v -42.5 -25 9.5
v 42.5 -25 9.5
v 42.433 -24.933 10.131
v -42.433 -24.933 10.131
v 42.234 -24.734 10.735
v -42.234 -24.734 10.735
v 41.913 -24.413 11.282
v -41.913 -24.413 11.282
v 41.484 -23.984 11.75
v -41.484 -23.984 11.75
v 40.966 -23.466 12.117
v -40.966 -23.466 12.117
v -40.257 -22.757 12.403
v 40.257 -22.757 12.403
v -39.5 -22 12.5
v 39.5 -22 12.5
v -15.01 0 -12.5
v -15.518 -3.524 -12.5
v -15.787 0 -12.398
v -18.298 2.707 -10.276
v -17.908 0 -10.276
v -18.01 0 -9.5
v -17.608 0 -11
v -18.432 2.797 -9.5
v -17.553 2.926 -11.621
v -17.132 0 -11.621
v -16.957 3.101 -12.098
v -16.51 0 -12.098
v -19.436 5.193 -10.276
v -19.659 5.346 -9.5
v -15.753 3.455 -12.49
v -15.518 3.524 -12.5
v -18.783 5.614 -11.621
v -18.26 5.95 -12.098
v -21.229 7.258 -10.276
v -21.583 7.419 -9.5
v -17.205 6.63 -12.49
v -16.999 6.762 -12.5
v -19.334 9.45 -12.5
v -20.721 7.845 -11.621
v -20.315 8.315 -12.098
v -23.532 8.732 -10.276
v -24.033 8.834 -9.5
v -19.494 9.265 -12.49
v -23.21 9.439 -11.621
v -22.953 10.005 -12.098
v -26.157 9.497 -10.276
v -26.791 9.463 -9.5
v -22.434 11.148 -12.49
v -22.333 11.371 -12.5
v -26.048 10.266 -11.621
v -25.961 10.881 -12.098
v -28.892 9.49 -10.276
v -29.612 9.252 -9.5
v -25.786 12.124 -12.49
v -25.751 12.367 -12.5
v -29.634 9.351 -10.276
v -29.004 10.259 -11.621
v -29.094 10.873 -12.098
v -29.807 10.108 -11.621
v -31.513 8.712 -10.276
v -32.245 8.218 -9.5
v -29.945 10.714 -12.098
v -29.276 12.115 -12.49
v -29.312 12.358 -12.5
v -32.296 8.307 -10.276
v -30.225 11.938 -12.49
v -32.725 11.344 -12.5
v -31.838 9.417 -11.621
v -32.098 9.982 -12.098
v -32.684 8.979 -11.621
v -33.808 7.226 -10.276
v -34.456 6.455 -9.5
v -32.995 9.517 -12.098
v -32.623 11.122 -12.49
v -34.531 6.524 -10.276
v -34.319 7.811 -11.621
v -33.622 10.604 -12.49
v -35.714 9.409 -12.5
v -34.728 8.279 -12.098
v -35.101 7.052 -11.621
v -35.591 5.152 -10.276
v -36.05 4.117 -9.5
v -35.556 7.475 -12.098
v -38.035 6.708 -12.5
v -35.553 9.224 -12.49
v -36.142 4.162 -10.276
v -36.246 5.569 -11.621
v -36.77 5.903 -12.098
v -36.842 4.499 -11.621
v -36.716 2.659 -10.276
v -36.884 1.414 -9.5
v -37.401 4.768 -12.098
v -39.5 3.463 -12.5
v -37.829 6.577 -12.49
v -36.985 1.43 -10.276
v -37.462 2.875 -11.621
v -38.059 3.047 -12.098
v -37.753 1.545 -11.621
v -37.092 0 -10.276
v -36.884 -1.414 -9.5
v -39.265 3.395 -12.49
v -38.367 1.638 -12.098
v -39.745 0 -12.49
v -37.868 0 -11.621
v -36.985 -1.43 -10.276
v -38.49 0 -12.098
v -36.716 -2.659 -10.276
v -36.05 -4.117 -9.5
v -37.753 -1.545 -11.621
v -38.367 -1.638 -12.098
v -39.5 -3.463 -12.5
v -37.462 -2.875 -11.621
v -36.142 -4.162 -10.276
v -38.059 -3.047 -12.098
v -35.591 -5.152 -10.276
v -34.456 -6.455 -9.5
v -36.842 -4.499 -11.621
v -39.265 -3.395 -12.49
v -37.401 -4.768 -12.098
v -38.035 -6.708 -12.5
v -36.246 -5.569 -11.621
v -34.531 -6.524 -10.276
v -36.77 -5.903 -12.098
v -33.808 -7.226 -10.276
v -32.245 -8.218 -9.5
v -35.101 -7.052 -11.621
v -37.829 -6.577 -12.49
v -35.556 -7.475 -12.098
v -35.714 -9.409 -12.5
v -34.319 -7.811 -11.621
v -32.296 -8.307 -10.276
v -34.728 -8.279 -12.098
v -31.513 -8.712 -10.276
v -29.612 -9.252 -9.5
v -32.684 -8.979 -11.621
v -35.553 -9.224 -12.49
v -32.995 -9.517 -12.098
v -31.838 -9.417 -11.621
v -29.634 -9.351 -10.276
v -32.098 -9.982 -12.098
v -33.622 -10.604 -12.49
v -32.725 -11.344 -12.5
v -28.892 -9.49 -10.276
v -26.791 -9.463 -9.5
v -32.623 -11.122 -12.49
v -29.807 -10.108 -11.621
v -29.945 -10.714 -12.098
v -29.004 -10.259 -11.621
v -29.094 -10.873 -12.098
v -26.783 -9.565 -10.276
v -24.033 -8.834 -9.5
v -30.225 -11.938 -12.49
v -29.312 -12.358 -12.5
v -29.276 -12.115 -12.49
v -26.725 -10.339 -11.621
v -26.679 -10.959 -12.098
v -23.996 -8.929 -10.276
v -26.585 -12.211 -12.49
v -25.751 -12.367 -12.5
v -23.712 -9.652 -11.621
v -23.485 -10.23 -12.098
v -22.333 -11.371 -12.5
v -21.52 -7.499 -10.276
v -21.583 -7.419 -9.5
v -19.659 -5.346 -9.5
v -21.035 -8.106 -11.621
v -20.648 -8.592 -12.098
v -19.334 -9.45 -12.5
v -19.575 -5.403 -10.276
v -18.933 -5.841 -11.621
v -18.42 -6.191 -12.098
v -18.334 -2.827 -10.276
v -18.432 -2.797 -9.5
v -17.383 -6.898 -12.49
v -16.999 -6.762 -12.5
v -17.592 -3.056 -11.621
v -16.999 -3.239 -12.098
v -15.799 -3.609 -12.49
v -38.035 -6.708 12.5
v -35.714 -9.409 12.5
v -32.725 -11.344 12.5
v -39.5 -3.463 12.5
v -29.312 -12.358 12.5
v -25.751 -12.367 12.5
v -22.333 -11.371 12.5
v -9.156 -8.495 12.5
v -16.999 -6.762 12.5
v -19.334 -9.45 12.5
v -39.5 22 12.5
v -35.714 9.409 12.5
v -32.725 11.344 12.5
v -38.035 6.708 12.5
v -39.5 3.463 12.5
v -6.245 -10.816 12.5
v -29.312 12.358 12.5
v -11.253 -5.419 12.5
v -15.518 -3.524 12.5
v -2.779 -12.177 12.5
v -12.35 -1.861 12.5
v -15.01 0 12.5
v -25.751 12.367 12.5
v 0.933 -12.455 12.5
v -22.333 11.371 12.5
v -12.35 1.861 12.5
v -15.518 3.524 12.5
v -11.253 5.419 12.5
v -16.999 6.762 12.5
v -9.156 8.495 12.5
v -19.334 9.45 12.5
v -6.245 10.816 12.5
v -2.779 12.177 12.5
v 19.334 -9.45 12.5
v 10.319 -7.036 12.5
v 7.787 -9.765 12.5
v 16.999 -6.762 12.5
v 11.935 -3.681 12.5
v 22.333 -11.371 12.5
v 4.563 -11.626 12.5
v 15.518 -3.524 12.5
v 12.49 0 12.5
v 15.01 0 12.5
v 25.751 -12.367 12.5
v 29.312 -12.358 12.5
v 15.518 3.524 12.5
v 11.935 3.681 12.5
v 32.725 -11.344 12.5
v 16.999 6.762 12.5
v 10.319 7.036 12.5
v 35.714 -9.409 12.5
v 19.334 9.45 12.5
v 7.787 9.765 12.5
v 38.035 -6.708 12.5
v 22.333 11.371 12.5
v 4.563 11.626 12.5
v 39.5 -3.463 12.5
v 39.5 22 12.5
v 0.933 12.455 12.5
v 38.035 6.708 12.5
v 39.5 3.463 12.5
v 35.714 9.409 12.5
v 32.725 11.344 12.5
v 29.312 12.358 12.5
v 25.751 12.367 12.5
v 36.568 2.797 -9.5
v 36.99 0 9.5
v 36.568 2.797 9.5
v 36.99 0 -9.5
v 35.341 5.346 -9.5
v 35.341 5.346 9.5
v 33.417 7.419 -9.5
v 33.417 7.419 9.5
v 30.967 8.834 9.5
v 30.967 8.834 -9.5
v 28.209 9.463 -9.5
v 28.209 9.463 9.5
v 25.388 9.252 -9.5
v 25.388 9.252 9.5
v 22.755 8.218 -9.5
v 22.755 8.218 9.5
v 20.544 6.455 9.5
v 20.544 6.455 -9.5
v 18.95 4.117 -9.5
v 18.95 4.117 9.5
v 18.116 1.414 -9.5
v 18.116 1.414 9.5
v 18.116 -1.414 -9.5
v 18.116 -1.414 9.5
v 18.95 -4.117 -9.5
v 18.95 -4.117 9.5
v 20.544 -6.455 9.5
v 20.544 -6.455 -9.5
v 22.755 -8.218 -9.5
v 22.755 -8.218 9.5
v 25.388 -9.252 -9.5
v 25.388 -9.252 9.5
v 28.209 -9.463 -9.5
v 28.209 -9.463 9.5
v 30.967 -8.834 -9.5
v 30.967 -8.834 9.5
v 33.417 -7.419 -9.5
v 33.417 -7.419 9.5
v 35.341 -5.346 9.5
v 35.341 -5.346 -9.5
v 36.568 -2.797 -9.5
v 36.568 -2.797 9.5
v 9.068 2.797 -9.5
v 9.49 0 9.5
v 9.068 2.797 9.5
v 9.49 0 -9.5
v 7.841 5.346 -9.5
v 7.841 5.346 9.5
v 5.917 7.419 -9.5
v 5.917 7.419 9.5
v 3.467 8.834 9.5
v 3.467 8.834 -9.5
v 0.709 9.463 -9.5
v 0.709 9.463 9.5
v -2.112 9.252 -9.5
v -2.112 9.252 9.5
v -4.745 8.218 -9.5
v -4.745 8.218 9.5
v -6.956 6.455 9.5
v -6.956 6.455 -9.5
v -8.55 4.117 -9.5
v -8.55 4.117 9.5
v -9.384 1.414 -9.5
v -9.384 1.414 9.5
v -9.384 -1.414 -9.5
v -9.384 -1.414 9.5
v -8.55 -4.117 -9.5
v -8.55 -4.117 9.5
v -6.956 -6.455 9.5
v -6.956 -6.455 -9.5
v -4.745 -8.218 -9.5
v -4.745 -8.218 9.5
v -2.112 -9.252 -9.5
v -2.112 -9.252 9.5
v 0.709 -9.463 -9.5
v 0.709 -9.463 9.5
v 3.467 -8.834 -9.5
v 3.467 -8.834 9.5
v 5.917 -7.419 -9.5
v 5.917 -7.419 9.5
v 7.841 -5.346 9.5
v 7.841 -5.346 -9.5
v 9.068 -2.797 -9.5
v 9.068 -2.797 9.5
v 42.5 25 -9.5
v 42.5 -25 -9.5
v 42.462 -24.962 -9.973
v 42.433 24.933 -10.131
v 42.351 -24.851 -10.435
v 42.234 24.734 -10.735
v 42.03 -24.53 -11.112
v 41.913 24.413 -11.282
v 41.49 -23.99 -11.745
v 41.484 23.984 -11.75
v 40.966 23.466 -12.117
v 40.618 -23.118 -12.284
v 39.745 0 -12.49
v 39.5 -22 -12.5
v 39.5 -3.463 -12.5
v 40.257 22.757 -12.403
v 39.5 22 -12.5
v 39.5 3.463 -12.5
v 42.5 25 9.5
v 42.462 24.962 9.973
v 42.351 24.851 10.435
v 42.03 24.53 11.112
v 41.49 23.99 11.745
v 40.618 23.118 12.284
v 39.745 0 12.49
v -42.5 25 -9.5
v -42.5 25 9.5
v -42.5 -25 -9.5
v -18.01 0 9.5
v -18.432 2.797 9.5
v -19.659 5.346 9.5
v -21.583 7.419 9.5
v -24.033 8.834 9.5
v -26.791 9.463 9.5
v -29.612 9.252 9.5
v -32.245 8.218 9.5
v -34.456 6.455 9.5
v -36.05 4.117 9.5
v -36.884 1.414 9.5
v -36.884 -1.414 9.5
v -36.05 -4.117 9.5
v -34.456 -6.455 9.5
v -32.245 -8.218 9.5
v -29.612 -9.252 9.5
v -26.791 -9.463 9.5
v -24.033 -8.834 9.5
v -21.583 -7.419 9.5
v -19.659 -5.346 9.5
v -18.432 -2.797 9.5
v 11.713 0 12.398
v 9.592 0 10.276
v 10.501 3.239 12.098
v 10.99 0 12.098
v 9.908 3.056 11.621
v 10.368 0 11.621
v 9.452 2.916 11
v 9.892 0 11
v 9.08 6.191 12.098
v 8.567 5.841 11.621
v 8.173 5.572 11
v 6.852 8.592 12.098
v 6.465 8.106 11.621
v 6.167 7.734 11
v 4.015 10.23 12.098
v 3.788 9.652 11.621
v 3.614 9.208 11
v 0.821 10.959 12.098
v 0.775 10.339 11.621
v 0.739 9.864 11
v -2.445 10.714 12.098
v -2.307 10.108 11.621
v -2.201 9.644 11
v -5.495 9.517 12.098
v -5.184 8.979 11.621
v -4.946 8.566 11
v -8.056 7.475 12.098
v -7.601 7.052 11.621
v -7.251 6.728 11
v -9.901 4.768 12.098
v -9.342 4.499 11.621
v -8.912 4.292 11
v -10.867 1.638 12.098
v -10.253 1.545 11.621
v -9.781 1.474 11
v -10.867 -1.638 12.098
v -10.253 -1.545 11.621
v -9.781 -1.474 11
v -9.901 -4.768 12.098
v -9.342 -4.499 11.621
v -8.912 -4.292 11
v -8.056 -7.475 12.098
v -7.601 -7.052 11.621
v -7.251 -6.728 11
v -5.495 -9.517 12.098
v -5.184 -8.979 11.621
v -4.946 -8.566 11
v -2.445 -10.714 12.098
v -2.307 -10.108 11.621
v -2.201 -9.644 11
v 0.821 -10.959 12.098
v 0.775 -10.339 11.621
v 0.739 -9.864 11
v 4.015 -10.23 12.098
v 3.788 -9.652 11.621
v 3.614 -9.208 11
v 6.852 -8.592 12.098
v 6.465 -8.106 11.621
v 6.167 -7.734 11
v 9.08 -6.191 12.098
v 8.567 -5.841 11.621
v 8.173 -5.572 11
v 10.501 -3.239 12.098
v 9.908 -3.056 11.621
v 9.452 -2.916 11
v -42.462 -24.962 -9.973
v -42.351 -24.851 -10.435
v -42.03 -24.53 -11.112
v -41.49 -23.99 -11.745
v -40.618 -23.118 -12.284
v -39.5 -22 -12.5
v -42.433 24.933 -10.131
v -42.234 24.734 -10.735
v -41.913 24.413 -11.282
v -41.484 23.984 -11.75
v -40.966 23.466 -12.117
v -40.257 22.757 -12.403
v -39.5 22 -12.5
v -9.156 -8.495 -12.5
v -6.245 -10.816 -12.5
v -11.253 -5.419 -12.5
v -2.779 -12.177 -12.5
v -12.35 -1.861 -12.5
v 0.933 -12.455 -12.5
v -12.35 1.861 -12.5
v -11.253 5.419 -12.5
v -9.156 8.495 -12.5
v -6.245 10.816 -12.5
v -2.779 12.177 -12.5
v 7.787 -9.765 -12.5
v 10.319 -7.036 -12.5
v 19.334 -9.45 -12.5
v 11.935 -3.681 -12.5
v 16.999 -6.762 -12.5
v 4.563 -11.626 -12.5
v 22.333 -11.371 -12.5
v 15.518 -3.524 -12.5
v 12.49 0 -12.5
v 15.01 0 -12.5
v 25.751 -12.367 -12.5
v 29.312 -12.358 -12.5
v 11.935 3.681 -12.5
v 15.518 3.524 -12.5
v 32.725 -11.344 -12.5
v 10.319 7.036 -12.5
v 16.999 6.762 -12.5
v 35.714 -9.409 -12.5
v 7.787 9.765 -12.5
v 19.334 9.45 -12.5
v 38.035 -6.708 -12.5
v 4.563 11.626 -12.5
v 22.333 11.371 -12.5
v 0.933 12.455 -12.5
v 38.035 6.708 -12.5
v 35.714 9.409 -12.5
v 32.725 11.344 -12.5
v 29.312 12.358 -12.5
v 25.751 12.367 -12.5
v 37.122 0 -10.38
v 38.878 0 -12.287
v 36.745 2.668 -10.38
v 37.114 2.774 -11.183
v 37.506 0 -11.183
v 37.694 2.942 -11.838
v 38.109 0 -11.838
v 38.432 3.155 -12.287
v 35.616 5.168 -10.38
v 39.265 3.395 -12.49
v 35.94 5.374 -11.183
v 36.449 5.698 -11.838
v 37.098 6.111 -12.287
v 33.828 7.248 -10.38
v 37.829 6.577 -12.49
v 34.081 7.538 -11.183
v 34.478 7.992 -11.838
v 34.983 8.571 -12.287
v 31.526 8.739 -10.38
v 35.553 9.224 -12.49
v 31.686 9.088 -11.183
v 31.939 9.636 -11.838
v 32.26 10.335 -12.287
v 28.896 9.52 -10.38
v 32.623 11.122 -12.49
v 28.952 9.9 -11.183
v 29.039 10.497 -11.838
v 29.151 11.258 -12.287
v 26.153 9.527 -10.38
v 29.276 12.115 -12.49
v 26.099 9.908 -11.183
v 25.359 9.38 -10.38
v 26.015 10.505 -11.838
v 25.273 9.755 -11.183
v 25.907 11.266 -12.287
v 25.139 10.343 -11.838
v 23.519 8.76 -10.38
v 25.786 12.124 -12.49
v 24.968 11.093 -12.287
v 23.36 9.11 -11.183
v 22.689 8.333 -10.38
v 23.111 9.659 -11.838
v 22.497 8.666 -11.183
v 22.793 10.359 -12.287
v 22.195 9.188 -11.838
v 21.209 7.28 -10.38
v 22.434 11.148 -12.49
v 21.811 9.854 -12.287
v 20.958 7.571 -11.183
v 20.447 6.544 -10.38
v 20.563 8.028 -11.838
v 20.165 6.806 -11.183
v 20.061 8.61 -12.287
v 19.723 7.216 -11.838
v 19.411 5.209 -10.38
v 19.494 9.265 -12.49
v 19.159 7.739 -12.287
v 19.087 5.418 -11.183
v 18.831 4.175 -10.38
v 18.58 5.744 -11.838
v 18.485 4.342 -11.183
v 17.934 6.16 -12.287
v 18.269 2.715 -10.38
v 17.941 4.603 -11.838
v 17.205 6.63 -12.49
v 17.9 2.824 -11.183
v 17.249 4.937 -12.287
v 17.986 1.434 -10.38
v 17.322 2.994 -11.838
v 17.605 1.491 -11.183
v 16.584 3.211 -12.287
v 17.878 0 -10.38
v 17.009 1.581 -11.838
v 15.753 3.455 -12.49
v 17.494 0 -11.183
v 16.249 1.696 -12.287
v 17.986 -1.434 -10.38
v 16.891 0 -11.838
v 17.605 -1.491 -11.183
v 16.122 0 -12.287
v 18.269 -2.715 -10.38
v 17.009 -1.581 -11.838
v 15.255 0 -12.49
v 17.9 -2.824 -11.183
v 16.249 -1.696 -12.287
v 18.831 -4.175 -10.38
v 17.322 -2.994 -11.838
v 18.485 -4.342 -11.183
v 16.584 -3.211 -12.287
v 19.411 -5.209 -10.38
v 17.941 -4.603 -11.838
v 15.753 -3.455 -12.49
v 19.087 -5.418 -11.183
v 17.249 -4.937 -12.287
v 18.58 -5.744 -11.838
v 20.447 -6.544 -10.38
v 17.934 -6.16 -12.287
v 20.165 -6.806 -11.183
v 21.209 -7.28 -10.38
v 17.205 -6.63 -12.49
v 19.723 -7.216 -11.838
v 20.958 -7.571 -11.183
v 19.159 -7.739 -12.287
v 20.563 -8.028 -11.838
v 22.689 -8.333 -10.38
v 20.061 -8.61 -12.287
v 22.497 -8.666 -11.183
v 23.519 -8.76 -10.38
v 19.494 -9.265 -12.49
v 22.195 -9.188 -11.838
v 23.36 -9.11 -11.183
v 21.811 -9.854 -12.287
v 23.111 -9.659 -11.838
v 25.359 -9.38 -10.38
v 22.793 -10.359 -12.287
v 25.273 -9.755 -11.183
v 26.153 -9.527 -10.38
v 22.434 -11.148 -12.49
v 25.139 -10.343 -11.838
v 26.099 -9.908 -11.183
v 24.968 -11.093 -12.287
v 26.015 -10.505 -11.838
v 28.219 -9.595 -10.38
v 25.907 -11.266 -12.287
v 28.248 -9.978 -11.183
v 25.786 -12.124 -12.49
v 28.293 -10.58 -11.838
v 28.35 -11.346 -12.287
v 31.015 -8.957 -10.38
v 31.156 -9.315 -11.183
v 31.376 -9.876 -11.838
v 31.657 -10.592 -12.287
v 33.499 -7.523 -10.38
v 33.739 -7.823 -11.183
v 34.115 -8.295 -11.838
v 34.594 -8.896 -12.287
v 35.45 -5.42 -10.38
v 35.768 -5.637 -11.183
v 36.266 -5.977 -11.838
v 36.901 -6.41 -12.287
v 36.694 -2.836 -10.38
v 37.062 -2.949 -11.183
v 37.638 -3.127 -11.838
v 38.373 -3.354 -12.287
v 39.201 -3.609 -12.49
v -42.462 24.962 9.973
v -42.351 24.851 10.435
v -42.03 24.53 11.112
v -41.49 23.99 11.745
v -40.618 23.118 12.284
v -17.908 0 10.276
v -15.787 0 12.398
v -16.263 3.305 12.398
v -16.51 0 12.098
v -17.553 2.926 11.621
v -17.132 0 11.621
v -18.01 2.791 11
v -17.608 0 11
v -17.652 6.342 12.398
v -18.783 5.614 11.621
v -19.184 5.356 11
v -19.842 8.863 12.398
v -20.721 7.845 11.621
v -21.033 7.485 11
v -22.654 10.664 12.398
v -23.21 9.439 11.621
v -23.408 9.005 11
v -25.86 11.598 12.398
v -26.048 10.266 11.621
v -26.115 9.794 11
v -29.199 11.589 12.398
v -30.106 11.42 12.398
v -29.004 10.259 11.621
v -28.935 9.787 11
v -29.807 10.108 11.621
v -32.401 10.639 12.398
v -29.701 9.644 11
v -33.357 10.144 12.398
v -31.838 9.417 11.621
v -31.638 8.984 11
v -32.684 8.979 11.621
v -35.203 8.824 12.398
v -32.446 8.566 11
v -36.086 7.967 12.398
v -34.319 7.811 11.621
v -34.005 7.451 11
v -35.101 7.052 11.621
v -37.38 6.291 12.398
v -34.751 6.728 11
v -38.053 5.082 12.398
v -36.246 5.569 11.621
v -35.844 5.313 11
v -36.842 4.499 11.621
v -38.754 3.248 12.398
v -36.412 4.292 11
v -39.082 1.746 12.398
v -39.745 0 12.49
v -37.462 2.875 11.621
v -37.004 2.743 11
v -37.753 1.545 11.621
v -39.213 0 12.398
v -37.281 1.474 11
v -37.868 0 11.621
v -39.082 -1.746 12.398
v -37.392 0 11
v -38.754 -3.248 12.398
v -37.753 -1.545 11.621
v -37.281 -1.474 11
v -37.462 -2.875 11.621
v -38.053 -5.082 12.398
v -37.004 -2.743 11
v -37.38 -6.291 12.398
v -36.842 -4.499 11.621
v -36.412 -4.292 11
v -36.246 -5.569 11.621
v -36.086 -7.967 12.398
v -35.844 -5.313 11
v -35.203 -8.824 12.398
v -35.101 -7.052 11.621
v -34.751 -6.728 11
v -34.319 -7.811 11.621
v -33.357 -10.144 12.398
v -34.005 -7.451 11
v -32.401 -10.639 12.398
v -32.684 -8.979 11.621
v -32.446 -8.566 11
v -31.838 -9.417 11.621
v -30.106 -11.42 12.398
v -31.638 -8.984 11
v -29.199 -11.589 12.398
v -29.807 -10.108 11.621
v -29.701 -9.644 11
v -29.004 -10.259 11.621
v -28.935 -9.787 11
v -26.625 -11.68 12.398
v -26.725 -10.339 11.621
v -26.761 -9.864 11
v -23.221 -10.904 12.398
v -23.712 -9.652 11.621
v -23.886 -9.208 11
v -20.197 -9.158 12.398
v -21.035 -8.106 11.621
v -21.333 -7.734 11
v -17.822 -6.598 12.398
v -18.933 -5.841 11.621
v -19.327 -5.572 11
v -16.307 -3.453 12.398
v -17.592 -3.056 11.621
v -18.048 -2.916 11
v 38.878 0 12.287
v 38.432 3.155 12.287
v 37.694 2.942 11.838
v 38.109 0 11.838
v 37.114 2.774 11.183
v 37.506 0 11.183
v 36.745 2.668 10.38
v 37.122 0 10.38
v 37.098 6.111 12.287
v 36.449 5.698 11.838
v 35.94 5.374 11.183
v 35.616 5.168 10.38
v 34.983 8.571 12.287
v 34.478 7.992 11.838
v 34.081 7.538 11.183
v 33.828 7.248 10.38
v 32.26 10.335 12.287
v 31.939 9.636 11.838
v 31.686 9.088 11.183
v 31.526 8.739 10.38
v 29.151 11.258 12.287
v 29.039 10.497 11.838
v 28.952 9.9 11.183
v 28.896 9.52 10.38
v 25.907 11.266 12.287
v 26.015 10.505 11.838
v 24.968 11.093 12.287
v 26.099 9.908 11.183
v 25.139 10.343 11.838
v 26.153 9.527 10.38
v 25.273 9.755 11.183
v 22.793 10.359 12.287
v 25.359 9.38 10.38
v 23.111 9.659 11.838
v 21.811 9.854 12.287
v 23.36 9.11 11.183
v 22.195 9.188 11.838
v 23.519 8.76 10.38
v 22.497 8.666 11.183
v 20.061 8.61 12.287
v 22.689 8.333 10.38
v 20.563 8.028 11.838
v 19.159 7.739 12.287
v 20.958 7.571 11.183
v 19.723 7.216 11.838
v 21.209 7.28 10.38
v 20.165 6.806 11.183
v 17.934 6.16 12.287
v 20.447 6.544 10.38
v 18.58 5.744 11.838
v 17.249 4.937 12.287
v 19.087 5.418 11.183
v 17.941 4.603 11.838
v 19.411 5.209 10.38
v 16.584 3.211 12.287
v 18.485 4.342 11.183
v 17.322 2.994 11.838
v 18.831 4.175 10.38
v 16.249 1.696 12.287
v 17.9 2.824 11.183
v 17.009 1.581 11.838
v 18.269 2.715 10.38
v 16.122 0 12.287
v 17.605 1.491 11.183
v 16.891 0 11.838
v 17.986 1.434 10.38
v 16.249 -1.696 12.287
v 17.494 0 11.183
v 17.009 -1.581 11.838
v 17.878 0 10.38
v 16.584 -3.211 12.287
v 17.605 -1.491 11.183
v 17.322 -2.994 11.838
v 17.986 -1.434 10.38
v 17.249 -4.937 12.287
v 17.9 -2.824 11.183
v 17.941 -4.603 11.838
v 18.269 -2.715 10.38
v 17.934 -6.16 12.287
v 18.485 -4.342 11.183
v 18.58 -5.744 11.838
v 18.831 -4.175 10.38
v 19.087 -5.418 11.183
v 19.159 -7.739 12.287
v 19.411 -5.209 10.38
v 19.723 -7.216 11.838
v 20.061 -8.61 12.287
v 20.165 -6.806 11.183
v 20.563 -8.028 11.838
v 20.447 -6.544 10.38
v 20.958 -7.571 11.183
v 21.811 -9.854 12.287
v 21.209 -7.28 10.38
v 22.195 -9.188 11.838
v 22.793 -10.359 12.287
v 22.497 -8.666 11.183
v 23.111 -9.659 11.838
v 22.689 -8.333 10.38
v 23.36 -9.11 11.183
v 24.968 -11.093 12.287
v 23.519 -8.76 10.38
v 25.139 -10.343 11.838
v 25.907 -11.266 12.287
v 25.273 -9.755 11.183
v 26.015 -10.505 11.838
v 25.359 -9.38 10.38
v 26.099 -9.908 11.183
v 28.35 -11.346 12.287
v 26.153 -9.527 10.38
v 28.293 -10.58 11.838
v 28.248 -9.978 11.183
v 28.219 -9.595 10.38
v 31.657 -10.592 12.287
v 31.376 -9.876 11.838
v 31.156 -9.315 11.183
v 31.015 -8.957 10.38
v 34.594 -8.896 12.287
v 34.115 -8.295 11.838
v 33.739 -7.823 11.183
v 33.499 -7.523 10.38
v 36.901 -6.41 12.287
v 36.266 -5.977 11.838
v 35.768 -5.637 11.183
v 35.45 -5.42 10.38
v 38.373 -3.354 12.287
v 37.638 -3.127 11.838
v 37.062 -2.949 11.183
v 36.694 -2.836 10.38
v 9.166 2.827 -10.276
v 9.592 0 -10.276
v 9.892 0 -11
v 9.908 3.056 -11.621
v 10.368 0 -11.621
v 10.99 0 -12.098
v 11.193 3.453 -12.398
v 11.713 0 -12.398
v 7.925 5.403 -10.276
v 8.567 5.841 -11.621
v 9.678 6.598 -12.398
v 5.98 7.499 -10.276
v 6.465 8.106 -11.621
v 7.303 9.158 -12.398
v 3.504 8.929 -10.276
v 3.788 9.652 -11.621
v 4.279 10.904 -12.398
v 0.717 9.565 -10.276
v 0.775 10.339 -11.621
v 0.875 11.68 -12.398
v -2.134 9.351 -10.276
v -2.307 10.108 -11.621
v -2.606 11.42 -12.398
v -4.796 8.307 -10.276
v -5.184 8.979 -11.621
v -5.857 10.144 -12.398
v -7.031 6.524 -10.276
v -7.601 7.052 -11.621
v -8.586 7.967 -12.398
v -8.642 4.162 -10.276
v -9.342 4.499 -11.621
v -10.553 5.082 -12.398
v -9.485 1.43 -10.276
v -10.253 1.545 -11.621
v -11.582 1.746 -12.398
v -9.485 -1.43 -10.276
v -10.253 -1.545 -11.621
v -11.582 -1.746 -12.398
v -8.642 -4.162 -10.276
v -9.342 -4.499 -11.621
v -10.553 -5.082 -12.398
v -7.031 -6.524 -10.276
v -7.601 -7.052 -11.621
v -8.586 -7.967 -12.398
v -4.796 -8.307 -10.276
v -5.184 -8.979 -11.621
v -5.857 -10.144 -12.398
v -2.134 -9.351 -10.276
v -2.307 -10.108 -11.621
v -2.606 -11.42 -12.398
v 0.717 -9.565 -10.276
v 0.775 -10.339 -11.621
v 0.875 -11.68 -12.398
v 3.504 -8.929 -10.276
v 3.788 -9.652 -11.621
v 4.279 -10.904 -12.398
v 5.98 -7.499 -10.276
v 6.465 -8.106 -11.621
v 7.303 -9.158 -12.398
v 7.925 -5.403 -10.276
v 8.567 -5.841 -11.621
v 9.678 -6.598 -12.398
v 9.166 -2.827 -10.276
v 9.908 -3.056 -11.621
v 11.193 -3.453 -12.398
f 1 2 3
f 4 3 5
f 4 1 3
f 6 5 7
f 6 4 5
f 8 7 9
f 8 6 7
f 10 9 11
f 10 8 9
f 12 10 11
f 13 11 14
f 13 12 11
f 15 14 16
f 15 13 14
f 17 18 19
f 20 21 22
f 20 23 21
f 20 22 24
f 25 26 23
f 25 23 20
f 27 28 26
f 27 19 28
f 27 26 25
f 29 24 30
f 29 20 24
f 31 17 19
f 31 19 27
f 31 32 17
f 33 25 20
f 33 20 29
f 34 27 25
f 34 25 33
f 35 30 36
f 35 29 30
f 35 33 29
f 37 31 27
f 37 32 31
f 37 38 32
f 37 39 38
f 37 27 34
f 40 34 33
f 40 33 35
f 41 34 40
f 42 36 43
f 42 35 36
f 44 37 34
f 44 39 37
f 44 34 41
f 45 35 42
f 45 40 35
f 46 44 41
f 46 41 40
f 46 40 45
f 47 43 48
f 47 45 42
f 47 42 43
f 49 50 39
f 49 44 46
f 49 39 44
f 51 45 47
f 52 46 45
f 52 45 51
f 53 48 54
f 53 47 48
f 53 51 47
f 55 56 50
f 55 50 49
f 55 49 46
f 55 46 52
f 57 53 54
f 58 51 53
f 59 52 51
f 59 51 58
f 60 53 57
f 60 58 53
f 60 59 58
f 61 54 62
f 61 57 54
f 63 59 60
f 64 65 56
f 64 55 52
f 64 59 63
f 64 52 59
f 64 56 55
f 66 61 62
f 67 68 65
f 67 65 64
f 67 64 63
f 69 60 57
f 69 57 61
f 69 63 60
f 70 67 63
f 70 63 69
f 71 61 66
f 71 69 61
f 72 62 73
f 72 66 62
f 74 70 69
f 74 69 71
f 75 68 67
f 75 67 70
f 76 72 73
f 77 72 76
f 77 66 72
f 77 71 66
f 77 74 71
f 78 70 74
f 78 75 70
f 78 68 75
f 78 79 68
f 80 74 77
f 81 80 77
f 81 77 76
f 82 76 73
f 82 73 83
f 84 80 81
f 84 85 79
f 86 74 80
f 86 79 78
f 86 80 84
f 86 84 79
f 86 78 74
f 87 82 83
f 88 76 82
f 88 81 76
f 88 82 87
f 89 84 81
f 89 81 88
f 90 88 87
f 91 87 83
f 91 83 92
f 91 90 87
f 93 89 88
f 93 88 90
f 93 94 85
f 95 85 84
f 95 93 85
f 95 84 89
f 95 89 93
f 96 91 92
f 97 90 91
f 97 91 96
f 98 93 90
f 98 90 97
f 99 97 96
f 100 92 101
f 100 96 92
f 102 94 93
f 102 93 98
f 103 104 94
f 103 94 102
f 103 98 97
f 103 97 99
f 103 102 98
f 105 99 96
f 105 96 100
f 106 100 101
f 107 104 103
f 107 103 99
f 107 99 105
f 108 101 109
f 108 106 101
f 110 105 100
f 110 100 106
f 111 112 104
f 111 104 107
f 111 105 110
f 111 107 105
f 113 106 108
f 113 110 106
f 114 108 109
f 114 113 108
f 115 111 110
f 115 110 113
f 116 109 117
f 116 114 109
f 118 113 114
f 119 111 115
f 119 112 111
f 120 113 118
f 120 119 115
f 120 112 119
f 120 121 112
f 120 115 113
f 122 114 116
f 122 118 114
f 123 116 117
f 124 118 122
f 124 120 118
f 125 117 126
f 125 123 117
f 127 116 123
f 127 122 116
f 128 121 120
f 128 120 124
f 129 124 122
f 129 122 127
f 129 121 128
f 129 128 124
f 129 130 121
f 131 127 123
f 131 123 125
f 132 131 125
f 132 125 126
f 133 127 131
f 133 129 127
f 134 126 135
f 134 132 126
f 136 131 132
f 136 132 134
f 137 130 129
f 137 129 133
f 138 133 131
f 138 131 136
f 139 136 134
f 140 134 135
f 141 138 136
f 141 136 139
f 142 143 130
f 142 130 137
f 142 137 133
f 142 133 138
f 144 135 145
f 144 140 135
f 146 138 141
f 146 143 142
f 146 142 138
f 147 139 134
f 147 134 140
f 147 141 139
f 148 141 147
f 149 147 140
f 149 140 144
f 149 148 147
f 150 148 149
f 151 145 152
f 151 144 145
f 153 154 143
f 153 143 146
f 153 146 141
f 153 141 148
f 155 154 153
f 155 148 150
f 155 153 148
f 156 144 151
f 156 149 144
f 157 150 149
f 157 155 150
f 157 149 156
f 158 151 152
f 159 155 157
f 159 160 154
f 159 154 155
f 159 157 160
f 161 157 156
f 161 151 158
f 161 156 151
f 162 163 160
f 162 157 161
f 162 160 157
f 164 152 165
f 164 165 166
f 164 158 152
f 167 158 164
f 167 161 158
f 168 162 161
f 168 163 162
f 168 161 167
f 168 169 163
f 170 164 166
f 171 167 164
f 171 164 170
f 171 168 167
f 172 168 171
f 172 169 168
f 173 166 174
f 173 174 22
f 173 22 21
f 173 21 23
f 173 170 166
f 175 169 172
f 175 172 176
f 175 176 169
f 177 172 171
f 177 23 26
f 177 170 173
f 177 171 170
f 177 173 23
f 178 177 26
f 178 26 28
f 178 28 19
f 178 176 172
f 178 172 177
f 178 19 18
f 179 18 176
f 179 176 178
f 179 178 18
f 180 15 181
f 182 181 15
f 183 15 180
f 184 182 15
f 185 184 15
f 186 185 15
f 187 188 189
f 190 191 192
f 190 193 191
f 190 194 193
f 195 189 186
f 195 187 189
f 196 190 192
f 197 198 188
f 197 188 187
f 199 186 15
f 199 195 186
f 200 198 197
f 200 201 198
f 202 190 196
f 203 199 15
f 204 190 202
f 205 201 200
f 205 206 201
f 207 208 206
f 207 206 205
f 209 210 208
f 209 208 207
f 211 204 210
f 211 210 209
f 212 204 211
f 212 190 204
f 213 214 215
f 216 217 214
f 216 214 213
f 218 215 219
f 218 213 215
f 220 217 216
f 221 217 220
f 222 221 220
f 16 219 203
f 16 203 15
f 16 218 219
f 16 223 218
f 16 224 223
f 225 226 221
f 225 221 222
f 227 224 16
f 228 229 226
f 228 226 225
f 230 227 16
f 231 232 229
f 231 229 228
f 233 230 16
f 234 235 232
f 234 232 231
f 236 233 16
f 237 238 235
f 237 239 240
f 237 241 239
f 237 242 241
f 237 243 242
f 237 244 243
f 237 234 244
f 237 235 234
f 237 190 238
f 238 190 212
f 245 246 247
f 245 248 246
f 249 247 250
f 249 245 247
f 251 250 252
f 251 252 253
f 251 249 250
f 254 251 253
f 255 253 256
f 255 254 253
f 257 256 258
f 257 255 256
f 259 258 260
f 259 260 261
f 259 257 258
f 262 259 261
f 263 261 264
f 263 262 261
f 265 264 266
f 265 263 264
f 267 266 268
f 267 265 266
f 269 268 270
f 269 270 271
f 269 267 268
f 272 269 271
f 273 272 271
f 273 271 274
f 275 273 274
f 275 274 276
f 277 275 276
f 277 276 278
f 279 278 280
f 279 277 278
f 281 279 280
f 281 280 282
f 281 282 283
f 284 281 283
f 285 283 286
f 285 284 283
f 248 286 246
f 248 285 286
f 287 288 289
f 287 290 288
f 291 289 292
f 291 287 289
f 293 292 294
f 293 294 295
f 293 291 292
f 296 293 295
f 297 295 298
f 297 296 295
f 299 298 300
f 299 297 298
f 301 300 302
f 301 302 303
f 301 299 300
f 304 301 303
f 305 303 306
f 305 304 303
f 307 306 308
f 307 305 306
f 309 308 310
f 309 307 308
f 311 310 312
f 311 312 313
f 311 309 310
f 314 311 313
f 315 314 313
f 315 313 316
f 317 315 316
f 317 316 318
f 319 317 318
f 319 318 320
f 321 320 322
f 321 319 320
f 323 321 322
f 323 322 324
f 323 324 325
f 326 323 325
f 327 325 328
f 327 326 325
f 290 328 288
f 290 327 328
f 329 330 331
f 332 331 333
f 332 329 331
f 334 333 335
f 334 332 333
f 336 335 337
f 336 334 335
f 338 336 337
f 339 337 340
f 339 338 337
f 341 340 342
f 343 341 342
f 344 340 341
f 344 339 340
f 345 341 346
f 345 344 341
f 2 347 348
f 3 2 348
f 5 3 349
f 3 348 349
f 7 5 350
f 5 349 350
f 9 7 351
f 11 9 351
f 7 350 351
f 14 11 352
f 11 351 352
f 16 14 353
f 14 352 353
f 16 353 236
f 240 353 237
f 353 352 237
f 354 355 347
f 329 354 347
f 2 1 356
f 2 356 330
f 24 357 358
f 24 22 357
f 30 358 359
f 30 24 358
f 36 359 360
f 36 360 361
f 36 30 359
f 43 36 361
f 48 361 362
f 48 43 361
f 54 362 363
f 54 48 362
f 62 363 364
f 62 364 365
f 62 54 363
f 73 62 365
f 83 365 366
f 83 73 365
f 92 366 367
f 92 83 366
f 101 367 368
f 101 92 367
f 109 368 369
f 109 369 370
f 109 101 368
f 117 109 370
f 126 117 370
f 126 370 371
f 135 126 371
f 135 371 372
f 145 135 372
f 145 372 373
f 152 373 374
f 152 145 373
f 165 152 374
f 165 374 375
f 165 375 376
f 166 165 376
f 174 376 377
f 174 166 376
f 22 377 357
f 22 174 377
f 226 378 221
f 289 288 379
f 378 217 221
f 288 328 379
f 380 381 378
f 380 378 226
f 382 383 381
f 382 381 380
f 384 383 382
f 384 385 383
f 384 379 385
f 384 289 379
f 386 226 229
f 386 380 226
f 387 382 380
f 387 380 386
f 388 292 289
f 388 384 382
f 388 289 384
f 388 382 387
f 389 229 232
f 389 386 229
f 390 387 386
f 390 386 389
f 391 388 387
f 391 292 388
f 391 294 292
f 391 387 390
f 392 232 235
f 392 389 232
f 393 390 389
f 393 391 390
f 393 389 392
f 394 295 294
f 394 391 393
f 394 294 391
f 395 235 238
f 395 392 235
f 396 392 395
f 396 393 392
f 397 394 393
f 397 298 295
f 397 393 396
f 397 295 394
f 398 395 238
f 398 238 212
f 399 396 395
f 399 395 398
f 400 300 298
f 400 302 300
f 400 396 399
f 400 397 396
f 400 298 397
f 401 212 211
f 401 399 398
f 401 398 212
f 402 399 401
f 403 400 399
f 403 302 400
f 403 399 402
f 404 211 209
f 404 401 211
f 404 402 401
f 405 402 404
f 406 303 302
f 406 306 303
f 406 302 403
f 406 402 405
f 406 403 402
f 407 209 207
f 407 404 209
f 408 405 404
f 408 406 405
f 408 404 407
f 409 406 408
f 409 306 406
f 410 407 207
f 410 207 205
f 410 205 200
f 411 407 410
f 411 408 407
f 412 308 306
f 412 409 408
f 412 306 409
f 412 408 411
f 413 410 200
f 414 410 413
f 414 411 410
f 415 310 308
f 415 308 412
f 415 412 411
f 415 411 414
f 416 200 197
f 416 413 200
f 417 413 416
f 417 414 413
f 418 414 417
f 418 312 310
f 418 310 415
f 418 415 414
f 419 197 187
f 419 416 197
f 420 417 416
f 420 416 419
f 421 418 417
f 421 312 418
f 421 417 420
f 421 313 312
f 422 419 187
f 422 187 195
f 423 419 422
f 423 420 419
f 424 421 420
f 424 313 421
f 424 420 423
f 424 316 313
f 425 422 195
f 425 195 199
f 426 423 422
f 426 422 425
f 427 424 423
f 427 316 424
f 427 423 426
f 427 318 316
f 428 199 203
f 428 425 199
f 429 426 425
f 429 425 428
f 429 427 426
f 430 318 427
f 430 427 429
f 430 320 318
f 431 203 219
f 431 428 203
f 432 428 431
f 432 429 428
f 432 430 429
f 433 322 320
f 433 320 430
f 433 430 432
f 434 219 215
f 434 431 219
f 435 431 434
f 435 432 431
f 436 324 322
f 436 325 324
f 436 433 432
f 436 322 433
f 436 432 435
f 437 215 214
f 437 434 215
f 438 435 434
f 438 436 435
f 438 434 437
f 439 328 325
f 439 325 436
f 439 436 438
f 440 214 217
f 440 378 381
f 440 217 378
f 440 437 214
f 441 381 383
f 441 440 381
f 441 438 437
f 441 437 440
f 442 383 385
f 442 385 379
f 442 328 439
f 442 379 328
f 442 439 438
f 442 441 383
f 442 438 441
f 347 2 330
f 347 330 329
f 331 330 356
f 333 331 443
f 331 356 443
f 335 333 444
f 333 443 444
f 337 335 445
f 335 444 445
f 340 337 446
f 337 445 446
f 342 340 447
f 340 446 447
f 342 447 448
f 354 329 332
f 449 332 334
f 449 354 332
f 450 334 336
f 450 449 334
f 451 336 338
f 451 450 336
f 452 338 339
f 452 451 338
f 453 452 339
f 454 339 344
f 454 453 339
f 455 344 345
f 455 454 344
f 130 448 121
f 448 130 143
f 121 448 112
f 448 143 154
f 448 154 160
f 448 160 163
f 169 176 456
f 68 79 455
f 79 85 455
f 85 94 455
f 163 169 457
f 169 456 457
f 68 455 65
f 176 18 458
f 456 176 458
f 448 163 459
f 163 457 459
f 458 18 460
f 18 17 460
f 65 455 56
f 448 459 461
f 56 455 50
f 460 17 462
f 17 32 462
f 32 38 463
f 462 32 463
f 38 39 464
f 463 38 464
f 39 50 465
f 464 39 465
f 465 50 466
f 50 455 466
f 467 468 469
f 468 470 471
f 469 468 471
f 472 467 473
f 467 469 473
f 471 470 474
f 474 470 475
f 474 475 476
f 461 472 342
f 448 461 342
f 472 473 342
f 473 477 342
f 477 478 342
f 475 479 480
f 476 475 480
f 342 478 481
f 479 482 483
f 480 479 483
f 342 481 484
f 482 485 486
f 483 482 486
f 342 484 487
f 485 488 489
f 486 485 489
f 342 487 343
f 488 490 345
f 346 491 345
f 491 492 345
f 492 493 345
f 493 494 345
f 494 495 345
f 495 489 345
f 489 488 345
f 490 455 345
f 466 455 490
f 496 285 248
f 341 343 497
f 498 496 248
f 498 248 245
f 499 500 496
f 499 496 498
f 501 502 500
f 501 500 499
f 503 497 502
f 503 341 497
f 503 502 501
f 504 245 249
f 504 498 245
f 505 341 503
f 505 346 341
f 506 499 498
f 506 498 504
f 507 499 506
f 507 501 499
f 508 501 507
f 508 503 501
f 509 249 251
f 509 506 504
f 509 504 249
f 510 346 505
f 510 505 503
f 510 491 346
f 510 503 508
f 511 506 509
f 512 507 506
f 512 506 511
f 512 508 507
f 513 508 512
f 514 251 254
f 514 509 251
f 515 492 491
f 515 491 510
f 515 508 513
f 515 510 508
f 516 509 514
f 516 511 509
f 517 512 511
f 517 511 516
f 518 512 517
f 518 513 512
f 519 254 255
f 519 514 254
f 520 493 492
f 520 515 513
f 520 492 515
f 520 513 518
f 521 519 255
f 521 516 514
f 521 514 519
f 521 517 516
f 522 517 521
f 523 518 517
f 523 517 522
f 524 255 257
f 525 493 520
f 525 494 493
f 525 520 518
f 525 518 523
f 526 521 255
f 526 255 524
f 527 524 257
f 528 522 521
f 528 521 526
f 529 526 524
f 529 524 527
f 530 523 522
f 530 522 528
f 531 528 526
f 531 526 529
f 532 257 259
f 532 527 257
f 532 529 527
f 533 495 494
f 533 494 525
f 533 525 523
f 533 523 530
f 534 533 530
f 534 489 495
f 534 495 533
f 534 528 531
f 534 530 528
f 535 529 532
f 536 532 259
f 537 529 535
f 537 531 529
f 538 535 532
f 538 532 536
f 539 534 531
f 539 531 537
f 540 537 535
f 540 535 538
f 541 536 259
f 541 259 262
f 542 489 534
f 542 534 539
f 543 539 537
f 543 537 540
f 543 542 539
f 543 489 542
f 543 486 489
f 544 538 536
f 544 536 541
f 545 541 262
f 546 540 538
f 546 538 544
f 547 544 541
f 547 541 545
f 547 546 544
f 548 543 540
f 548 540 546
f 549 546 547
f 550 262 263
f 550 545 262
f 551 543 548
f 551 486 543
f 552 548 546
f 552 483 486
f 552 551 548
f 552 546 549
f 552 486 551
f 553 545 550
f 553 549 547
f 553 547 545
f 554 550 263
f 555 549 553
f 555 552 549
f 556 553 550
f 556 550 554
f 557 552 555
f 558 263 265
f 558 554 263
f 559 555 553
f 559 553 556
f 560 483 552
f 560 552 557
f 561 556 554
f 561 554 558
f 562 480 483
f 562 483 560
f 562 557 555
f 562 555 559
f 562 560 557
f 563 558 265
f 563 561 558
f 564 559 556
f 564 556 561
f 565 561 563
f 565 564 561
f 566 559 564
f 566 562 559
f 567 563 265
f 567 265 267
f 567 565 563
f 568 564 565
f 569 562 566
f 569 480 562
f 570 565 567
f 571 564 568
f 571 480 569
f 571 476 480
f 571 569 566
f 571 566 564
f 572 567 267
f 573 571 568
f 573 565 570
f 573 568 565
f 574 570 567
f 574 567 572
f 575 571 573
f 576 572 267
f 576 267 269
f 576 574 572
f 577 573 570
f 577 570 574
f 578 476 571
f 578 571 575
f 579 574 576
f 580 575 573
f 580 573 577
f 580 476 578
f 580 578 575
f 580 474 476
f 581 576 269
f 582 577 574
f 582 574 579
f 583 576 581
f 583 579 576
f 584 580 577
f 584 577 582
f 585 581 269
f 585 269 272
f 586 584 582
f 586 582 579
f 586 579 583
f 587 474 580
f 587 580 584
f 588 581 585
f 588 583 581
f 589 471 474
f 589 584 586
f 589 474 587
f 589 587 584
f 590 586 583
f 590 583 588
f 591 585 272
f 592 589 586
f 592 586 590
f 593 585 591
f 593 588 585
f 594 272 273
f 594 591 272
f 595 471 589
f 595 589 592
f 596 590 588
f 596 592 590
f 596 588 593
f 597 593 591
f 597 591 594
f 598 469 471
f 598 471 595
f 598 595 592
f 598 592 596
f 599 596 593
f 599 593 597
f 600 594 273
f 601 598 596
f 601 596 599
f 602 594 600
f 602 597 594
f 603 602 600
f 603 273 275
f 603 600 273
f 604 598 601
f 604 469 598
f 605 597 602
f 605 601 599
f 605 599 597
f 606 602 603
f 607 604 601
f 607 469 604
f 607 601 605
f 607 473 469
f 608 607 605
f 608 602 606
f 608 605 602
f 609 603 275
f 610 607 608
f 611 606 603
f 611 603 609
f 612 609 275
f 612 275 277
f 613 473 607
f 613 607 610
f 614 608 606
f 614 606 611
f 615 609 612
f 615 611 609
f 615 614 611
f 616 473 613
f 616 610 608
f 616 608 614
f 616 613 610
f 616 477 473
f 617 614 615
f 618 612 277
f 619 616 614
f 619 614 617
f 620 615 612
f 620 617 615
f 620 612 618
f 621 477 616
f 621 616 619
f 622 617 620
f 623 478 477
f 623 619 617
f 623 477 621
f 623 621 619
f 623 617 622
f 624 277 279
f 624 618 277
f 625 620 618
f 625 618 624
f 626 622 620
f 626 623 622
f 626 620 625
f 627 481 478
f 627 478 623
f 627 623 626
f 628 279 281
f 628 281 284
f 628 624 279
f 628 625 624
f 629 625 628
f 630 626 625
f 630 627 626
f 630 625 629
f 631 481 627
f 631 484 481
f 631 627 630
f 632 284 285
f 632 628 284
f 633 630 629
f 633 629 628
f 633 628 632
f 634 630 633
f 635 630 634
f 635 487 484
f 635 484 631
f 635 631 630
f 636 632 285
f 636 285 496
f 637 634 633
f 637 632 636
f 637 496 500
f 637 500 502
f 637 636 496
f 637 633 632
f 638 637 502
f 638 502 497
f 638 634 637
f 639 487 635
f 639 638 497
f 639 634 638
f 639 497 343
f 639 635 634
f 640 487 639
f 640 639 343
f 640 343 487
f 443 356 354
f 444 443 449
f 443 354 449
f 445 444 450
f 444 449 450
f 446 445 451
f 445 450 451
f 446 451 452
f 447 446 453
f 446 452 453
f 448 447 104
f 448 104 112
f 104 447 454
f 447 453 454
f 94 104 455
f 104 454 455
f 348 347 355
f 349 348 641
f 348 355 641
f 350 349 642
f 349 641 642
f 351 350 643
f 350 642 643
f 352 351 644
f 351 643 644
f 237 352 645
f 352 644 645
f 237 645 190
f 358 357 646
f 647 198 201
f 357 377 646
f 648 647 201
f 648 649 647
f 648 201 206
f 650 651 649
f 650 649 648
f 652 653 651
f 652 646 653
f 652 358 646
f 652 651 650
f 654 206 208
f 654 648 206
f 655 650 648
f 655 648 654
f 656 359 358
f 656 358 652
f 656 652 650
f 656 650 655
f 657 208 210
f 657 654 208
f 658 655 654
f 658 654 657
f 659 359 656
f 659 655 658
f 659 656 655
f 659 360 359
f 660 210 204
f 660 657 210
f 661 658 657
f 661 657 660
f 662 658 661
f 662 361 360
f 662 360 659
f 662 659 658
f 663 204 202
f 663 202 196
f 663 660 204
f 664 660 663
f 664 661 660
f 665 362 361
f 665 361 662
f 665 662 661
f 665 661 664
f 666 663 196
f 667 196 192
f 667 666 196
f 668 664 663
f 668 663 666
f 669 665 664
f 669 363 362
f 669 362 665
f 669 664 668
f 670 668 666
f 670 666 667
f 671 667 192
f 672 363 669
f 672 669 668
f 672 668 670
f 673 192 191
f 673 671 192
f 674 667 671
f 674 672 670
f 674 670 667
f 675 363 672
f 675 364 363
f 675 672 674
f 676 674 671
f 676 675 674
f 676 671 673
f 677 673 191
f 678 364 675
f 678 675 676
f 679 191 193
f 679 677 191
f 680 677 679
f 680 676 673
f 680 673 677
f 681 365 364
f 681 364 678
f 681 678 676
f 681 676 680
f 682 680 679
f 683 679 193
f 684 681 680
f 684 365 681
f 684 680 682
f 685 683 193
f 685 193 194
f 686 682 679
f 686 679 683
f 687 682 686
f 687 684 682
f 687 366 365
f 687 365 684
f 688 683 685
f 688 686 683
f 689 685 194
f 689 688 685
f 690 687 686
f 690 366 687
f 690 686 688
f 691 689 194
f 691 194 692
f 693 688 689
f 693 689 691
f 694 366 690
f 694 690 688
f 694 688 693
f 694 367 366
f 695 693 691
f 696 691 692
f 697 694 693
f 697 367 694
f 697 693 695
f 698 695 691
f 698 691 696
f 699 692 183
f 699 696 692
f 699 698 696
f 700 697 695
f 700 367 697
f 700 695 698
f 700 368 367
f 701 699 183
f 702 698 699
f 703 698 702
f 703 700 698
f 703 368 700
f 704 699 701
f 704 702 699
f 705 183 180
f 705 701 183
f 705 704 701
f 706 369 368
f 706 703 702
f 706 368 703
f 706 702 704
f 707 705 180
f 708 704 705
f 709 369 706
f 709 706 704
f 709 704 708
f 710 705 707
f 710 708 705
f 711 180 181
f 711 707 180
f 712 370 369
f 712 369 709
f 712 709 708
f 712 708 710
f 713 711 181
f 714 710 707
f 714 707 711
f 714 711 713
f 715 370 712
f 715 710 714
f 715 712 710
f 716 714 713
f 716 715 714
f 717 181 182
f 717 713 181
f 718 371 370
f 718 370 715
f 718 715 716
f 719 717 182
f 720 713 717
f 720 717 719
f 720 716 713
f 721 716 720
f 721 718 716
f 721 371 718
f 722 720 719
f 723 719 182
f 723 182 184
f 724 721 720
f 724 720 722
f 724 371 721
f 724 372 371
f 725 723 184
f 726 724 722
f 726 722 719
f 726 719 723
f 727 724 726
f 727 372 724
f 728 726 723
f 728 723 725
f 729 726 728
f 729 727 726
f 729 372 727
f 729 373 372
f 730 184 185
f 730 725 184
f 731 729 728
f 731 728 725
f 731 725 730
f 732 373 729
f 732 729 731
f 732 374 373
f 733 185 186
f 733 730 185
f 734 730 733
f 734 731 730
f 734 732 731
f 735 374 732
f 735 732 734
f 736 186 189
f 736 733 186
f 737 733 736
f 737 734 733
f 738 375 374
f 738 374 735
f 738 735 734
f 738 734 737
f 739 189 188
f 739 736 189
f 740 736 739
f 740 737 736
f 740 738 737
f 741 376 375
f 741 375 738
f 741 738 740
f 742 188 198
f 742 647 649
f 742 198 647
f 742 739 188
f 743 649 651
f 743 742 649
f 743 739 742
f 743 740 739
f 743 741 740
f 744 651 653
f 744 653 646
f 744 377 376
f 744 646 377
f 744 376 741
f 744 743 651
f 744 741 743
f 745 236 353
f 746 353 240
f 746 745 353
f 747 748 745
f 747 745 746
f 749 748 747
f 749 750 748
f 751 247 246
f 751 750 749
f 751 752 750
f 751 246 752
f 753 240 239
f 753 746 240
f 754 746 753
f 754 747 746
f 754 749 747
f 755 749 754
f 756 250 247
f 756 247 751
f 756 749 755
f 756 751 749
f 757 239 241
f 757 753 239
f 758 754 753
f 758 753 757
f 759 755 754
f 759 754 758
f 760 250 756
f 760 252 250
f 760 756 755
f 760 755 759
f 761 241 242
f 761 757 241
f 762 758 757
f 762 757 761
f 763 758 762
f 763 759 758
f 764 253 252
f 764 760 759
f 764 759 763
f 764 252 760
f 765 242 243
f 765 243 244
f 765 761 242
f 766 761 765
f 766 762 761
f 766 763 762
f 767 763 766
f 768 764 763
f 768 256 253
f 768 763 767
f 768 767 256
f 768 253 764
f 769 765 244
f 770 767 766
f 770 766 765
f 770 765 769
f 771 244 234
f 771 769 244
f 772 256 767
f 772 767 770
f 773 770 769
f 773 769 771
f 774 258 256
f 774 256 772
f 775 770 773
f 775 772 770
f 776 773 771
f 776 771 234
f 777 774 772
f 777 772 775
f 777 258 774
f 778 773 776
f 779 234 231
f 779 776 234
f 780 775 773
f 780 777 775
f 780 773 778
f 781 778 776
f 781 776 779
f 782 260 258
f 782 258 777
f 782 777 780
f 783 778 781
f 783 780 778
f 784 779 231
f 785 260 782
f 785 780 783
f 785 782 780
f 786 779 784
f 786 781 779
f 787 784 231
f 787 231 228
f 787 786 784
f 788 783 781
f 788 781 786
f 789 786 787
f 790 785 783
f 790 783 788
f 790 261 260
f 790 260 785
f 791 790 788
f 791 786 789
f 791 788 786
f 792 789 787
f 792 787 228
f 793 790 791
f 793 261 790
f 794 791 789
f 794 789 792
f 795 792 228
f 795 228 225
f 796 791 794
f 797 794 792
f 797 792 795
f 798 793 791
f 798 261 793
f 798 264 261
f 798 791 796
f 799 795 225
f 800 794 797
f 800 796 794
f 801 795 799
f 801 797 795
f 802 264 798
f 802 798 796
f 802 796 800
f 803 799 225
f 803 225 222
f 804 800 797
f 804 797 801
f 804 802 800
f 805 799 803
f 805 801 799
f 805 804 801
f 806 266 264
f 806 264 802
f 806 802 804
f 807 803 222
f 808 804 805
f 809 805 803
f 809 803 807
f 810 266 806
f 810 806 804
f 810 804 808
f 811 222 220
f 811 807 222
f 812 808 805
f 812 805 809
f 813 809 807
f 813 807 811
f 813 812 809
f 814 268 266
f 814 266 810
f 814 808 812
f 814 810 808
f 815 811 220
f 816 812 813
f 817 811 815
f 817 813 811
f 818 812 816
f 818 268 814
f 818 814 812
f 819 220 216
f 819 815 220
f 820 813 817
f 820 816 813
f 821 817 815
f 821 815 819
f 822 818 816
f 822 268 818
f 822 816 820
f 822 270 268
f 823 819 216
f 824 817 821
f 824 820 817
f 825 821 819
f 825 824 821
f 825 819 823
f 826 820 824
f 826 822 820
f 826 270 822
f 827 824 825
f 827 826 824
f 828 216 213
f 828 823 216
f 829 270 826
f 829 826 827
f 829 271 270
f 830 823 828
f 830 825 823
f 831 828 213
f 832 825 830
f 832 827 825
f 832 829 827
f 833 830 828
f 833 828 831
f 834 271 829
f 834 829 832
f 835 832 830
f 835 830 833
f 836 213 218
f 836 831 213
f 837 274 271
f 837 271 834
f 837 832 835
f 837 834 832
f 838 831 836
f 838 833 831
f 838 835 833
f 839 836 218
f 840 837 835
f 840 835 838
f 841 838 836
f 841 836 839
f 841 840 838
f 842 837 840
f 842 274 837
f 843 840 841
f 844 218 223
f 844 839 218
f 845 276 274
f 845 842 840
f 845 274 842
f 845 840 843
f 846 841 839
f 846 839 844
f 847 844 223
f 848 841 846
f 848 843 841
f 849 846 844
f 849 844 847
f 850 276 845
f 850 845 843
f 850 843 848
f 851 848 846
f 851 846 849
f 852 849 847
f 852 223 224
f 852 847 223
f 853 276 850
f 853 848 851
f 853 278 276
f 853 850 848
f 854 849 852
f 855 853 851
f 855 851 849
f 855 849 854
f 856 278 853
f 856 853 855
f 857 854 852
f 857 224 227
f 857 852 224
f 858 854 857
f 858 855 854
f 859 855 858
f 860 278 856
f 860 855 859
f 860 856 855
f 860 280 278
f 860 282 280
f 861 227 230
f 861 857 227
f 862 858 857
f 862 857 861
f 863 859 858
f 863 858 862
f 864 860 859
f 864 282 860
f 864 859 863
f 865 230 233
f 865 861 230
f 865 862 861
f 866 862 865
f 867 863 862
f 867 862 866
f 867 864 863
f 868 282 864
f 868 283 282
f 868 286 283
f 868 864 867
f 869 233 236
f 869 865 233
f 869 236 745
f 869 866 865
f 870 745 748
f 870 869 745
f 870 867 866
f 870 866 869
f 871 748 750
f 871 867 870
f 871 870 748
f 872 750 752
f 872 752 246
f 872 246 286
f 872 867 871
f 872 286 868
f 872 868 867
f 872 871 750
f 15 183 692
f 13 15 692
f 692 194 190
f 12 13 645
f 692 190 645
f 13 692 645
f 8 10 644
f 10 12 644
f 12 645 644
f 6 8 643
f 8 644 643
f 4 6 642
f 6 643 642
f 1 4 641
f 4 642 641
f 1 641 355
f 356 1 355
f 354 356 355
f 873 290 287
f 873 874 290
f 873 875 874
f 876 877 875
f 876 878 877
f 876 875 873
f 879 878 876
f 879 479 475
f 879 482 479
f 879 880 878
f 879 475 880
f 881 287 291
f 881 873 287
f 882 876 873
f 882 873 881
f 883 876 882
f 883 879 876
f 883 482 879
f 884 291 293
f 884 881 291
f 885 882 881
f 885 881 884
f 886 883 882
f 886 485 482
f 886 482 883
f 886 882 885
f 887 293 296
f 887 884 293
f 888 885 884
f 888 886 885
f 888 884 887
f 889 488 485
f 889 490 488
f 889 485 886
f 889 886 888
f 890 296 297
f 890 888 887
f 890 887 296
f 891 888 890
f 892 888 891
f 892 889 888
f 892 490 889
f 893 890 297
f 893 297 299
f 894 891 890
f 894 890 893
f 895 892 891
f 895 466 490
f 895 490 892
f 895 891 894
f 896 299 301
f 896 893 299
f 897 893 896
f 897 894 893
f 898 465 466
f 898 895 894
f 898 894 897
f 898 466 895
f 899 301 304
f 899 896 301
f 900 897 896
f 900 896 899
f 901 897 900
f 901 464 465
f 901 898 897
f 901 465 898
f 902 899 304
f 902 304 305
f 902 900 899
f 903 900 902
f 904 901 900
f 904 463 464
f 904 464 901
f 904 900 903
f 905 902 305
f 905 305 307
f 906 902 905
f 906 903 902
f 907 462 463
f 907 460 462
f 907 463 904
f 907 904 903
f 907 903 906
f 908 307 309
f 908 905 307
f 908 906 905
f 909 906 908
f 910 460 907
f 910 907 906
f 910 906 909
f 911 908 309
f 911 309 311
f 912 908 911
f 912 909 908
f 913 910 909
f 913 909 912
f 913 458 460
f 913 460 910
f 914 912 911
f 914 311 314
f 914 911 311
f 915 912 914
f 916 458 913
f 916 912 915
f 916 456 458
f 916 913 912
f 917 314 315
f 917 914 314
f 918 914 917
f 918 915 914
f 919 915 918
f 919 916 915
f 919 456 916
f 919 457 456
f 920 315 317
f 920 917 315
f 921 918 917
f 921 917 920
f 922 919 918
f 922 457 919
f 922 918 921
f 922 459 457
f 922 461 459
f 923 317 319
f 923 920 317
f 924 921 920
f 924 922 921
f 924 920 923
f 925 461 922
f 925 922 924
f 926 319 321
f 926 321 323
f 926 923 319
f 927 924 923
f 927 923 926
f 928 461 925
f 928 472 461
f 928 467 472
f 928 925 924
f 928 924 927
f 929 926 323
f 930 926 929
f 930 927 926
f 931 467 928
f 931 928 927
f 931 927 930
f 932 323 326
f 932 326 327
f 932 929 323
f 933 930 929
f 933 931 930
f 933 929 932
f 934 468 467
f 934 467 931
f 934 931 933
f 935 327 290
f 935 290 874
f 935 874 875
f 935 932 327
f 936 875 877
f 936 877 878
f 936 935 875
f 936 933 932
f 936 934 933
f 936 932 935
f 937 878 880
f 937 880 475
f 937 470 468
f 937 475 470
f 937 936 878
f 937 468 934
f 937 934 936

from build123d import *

# Parameters (mm, degrees)
F0_W        = 85
F0_H        = 50
F0_R        = 9.4896573641
F1_DEPTH    = 12.5
F2_T1_DEPTH = 100
F2_T3_DEPTH = 65


# Not quite as in the source:
# - a fillet or chamfer that OpenCascade refuses, or shapes differently, is made with other operations: its cross-section is extruded or revolved along the edge and cut away or added


with BuildPart() as f1:
    # F0 (on Top) → F1 (new body, symmetric)
    with BuildSketch(Plane.XY):
        Rectangle(F0_W, F0_H)
        with Locations((-27.5, 0)):
            Circle(F0_R, mode=Mode.SUBTRACT)
        Circle(F0_R, mode=Mode.SUBTRACT)
        with Locations((27.5, 0)):
            Circle(F0_R, mode=Mode.SUBTRACT)
    extrude(amount=F1_DEPTH, both=True)

    # F2: fillet of radius 3 on 14 edges, made by hand

    # F2_s2 → F2_t1 (cut)
    with BuildSketch(Plane.YZ.offset(-50)):
        with BuildLine():
            ThreePointArc((25, -9.5), (24.1213203436, -11.6213203436), (22, -12.5))
            Line((22, -12.5), (25, -12.5))
            Line((25, -12.5), (25, -9.5))
        make_face()
        with BuildLine():
            ThreePointArc((-25, -9.5), (-24.1213203436, -11.6213203436), (-22, -12.5))
            Line((-22, -12.5), (-25, -12.5))
            Line((-25, -12.5), (-25, -9.5))
        make_face()
        with BuildLine():
            ThreePointArc((25, 9.5), (24.1213203436, 11.6213203436), (22, 12.5))
            Line((22, 12.5), (25, 12.5))
            Line((25, 12.5), (25, 9.5))
        make_face()
        with BuildLine():
            ThreePointArc((-25, 9.5), (-24.1213203436, 11.6213203436), (-22, 12.5))
            Line((-22, 12.5), (-25, 12.5))
            Line((-25, 12.5), (-25, 9.5))
        make_face()
    extrude(amount=F2_T1_DEPTH, mode=Mode.SUBTRACT)

    # F2_s4 → F2_t3 (cut)
    with BuildSketch(Plane.XZ.offset(-32.5)):
        with BuildLine():
            ThreePointArc((-42.5, -9.5), (-41.6213203436, -11.6213203436), (-39.5, -12.5))
            Line((-39.5, -12.5), (-42.5, -12.5))
            Line((-42.5, -12.5), (-42.5, -9.5))
        make_face()
        with BuildLine():
            ThreePointArc((42.5, -9.5), (41.6213203436, -11.6213203436), (39.5, -12.5))
            Line((39.5, -12.5), (42.5, -12.5))
            Line((42.5, -12.5), (42.5, -9.5))
        make_face()
        with BuildLine():
            ThreePointArc((-39.5, 12.5), (-41.6213203436, 11.6213203436), (-42.5, 9.5))
            Line((-42.5, 9.5), (-42.5, 12.5))
            Line((-42.5, 12.5), (-39.5, 12.5))
        make_face()
        with BuildLine():
            ThreePointArc((42.5, 9.5), (41.6213203436, 11.6213203436), (39.5, 12.5))
            Line((39.5, 12.5), (42.5, 12.5))
            Line((42.5, 12.5), (42.5, 9.5))
        make_face()
    extrude(amount=F2_T3_DEPTH, mode=Mode.SUBTRACT)

    # F2_s5 → F2_t6 (revolve, cut)
    with BuildSketch(Plane.XZ):
        with BuildLine():
            ThreePointArc((36.9896573641, -9.5), (37.8683370205, -11.6213203436), (39.9896573641, -12.5))
            Line((39.9896573641, -12.5), (36.9896573641, -12.5))
            Line((36.9896573641, -12.5), (36.9896573641, -9.5))
        make_face()
    revolve(axis=Axis((27.5, 0, -12.5), (0, 0, 1)), mode=Mode.SUBTRACT)

    # F2_s7 → F2_t8 (revolve, cut)
    with BuildSketch(Plane.XZ):
        with BuildLine():
            ThreePointArc((9.4896573641, -9.5), (10.3683370205, -11.6213203436), (12.4896573641, -12.5))
            Line((12.4896573641, -12.5), (9.4896573641, -12.5))
            Line((9.4896573641, -12.5), (9.4896573641, -9.5))
        make_face()
    revolve(axis=Axis((0, 0, -12.5), (0, 0, 1)), mode=Mode.SUBTRACT)

    # F2_s9 → F2_t10 (revolve, cut)
    with BuildSketch(Plane.XZ):
        with BuildLine():
            ThreePointArc((-18.0103426359, -9.5), (-17.1316629795, -11.6213203436), (-15.0103426359, -12.5))
            Line((-15.0103426359, -12.5), (-18.0103426359, -12.5))
            Line((-18.0103426359, -12.5), (-18.0103426359, -9.5))
        make_face()
    revolve(axis=Axis((-27.5, 0, -12.5), (0, 0, 1)), mode=Mode.SUBTRACT)

    # F2_s11 → F2_t12 (revolve, cut)
    with BuildSketch(Plane.XZ):
        with BuildLine():
            ThreePointArc((39.9896573641, 12.5), (37.8683370205, 11.6213203436), (36.9896573641, 9.5))
            Line((36.9896573641, 9.5), (36.9896573641, 12.5))
            Line((36.9896573641, 12.5), (39.9896573641, 12.5))
        make_face()
    revolve(axis=Axis((27.5, 0, 12.5), (0, 0, 1)), mode=Mode.SUBTRACT)

    # F2_s13 → F2_t14 (revolve, cut)
    with BuildSketch(Plane.XZ):
        with BuildLine():
            ThreePointArc((12.4896573641, 12.5), (10.3683370205, 11.6213203436), (9.4896573641, 9.5))
            Line((9.4896573641, 9.5), (9.4896573641, 12.5))
            Line((9.4896573641, 12.5), (12.4896573641, 12.5))
        make_face()
    revolve(axis=Axis((0, 0, 12.5), (0, 0, 1)), mode=Mode.SUBTRACT)

    # F2_s15 → F2_t16 (revolve, cut)
    with BuildSketch(Plane.XZ):
        with BuildLine():
            ThreePointArc((-15.0103426359, 12.5), (-17.1316629795, 11.6213203436), (-18.0103426359, 9.5))
            Line((-18.0103426359, 9.5), (-18.0103426359, 12.5))
            Line((-18.0103426359, 12.5), (-15.0103426359, 12.5))
        make_face()
    revolve(axis=Axis((-27.5, 0, 12.5), (0, 0, 1)), mode=Mode.SUBTRACT)


solid = f1.part
